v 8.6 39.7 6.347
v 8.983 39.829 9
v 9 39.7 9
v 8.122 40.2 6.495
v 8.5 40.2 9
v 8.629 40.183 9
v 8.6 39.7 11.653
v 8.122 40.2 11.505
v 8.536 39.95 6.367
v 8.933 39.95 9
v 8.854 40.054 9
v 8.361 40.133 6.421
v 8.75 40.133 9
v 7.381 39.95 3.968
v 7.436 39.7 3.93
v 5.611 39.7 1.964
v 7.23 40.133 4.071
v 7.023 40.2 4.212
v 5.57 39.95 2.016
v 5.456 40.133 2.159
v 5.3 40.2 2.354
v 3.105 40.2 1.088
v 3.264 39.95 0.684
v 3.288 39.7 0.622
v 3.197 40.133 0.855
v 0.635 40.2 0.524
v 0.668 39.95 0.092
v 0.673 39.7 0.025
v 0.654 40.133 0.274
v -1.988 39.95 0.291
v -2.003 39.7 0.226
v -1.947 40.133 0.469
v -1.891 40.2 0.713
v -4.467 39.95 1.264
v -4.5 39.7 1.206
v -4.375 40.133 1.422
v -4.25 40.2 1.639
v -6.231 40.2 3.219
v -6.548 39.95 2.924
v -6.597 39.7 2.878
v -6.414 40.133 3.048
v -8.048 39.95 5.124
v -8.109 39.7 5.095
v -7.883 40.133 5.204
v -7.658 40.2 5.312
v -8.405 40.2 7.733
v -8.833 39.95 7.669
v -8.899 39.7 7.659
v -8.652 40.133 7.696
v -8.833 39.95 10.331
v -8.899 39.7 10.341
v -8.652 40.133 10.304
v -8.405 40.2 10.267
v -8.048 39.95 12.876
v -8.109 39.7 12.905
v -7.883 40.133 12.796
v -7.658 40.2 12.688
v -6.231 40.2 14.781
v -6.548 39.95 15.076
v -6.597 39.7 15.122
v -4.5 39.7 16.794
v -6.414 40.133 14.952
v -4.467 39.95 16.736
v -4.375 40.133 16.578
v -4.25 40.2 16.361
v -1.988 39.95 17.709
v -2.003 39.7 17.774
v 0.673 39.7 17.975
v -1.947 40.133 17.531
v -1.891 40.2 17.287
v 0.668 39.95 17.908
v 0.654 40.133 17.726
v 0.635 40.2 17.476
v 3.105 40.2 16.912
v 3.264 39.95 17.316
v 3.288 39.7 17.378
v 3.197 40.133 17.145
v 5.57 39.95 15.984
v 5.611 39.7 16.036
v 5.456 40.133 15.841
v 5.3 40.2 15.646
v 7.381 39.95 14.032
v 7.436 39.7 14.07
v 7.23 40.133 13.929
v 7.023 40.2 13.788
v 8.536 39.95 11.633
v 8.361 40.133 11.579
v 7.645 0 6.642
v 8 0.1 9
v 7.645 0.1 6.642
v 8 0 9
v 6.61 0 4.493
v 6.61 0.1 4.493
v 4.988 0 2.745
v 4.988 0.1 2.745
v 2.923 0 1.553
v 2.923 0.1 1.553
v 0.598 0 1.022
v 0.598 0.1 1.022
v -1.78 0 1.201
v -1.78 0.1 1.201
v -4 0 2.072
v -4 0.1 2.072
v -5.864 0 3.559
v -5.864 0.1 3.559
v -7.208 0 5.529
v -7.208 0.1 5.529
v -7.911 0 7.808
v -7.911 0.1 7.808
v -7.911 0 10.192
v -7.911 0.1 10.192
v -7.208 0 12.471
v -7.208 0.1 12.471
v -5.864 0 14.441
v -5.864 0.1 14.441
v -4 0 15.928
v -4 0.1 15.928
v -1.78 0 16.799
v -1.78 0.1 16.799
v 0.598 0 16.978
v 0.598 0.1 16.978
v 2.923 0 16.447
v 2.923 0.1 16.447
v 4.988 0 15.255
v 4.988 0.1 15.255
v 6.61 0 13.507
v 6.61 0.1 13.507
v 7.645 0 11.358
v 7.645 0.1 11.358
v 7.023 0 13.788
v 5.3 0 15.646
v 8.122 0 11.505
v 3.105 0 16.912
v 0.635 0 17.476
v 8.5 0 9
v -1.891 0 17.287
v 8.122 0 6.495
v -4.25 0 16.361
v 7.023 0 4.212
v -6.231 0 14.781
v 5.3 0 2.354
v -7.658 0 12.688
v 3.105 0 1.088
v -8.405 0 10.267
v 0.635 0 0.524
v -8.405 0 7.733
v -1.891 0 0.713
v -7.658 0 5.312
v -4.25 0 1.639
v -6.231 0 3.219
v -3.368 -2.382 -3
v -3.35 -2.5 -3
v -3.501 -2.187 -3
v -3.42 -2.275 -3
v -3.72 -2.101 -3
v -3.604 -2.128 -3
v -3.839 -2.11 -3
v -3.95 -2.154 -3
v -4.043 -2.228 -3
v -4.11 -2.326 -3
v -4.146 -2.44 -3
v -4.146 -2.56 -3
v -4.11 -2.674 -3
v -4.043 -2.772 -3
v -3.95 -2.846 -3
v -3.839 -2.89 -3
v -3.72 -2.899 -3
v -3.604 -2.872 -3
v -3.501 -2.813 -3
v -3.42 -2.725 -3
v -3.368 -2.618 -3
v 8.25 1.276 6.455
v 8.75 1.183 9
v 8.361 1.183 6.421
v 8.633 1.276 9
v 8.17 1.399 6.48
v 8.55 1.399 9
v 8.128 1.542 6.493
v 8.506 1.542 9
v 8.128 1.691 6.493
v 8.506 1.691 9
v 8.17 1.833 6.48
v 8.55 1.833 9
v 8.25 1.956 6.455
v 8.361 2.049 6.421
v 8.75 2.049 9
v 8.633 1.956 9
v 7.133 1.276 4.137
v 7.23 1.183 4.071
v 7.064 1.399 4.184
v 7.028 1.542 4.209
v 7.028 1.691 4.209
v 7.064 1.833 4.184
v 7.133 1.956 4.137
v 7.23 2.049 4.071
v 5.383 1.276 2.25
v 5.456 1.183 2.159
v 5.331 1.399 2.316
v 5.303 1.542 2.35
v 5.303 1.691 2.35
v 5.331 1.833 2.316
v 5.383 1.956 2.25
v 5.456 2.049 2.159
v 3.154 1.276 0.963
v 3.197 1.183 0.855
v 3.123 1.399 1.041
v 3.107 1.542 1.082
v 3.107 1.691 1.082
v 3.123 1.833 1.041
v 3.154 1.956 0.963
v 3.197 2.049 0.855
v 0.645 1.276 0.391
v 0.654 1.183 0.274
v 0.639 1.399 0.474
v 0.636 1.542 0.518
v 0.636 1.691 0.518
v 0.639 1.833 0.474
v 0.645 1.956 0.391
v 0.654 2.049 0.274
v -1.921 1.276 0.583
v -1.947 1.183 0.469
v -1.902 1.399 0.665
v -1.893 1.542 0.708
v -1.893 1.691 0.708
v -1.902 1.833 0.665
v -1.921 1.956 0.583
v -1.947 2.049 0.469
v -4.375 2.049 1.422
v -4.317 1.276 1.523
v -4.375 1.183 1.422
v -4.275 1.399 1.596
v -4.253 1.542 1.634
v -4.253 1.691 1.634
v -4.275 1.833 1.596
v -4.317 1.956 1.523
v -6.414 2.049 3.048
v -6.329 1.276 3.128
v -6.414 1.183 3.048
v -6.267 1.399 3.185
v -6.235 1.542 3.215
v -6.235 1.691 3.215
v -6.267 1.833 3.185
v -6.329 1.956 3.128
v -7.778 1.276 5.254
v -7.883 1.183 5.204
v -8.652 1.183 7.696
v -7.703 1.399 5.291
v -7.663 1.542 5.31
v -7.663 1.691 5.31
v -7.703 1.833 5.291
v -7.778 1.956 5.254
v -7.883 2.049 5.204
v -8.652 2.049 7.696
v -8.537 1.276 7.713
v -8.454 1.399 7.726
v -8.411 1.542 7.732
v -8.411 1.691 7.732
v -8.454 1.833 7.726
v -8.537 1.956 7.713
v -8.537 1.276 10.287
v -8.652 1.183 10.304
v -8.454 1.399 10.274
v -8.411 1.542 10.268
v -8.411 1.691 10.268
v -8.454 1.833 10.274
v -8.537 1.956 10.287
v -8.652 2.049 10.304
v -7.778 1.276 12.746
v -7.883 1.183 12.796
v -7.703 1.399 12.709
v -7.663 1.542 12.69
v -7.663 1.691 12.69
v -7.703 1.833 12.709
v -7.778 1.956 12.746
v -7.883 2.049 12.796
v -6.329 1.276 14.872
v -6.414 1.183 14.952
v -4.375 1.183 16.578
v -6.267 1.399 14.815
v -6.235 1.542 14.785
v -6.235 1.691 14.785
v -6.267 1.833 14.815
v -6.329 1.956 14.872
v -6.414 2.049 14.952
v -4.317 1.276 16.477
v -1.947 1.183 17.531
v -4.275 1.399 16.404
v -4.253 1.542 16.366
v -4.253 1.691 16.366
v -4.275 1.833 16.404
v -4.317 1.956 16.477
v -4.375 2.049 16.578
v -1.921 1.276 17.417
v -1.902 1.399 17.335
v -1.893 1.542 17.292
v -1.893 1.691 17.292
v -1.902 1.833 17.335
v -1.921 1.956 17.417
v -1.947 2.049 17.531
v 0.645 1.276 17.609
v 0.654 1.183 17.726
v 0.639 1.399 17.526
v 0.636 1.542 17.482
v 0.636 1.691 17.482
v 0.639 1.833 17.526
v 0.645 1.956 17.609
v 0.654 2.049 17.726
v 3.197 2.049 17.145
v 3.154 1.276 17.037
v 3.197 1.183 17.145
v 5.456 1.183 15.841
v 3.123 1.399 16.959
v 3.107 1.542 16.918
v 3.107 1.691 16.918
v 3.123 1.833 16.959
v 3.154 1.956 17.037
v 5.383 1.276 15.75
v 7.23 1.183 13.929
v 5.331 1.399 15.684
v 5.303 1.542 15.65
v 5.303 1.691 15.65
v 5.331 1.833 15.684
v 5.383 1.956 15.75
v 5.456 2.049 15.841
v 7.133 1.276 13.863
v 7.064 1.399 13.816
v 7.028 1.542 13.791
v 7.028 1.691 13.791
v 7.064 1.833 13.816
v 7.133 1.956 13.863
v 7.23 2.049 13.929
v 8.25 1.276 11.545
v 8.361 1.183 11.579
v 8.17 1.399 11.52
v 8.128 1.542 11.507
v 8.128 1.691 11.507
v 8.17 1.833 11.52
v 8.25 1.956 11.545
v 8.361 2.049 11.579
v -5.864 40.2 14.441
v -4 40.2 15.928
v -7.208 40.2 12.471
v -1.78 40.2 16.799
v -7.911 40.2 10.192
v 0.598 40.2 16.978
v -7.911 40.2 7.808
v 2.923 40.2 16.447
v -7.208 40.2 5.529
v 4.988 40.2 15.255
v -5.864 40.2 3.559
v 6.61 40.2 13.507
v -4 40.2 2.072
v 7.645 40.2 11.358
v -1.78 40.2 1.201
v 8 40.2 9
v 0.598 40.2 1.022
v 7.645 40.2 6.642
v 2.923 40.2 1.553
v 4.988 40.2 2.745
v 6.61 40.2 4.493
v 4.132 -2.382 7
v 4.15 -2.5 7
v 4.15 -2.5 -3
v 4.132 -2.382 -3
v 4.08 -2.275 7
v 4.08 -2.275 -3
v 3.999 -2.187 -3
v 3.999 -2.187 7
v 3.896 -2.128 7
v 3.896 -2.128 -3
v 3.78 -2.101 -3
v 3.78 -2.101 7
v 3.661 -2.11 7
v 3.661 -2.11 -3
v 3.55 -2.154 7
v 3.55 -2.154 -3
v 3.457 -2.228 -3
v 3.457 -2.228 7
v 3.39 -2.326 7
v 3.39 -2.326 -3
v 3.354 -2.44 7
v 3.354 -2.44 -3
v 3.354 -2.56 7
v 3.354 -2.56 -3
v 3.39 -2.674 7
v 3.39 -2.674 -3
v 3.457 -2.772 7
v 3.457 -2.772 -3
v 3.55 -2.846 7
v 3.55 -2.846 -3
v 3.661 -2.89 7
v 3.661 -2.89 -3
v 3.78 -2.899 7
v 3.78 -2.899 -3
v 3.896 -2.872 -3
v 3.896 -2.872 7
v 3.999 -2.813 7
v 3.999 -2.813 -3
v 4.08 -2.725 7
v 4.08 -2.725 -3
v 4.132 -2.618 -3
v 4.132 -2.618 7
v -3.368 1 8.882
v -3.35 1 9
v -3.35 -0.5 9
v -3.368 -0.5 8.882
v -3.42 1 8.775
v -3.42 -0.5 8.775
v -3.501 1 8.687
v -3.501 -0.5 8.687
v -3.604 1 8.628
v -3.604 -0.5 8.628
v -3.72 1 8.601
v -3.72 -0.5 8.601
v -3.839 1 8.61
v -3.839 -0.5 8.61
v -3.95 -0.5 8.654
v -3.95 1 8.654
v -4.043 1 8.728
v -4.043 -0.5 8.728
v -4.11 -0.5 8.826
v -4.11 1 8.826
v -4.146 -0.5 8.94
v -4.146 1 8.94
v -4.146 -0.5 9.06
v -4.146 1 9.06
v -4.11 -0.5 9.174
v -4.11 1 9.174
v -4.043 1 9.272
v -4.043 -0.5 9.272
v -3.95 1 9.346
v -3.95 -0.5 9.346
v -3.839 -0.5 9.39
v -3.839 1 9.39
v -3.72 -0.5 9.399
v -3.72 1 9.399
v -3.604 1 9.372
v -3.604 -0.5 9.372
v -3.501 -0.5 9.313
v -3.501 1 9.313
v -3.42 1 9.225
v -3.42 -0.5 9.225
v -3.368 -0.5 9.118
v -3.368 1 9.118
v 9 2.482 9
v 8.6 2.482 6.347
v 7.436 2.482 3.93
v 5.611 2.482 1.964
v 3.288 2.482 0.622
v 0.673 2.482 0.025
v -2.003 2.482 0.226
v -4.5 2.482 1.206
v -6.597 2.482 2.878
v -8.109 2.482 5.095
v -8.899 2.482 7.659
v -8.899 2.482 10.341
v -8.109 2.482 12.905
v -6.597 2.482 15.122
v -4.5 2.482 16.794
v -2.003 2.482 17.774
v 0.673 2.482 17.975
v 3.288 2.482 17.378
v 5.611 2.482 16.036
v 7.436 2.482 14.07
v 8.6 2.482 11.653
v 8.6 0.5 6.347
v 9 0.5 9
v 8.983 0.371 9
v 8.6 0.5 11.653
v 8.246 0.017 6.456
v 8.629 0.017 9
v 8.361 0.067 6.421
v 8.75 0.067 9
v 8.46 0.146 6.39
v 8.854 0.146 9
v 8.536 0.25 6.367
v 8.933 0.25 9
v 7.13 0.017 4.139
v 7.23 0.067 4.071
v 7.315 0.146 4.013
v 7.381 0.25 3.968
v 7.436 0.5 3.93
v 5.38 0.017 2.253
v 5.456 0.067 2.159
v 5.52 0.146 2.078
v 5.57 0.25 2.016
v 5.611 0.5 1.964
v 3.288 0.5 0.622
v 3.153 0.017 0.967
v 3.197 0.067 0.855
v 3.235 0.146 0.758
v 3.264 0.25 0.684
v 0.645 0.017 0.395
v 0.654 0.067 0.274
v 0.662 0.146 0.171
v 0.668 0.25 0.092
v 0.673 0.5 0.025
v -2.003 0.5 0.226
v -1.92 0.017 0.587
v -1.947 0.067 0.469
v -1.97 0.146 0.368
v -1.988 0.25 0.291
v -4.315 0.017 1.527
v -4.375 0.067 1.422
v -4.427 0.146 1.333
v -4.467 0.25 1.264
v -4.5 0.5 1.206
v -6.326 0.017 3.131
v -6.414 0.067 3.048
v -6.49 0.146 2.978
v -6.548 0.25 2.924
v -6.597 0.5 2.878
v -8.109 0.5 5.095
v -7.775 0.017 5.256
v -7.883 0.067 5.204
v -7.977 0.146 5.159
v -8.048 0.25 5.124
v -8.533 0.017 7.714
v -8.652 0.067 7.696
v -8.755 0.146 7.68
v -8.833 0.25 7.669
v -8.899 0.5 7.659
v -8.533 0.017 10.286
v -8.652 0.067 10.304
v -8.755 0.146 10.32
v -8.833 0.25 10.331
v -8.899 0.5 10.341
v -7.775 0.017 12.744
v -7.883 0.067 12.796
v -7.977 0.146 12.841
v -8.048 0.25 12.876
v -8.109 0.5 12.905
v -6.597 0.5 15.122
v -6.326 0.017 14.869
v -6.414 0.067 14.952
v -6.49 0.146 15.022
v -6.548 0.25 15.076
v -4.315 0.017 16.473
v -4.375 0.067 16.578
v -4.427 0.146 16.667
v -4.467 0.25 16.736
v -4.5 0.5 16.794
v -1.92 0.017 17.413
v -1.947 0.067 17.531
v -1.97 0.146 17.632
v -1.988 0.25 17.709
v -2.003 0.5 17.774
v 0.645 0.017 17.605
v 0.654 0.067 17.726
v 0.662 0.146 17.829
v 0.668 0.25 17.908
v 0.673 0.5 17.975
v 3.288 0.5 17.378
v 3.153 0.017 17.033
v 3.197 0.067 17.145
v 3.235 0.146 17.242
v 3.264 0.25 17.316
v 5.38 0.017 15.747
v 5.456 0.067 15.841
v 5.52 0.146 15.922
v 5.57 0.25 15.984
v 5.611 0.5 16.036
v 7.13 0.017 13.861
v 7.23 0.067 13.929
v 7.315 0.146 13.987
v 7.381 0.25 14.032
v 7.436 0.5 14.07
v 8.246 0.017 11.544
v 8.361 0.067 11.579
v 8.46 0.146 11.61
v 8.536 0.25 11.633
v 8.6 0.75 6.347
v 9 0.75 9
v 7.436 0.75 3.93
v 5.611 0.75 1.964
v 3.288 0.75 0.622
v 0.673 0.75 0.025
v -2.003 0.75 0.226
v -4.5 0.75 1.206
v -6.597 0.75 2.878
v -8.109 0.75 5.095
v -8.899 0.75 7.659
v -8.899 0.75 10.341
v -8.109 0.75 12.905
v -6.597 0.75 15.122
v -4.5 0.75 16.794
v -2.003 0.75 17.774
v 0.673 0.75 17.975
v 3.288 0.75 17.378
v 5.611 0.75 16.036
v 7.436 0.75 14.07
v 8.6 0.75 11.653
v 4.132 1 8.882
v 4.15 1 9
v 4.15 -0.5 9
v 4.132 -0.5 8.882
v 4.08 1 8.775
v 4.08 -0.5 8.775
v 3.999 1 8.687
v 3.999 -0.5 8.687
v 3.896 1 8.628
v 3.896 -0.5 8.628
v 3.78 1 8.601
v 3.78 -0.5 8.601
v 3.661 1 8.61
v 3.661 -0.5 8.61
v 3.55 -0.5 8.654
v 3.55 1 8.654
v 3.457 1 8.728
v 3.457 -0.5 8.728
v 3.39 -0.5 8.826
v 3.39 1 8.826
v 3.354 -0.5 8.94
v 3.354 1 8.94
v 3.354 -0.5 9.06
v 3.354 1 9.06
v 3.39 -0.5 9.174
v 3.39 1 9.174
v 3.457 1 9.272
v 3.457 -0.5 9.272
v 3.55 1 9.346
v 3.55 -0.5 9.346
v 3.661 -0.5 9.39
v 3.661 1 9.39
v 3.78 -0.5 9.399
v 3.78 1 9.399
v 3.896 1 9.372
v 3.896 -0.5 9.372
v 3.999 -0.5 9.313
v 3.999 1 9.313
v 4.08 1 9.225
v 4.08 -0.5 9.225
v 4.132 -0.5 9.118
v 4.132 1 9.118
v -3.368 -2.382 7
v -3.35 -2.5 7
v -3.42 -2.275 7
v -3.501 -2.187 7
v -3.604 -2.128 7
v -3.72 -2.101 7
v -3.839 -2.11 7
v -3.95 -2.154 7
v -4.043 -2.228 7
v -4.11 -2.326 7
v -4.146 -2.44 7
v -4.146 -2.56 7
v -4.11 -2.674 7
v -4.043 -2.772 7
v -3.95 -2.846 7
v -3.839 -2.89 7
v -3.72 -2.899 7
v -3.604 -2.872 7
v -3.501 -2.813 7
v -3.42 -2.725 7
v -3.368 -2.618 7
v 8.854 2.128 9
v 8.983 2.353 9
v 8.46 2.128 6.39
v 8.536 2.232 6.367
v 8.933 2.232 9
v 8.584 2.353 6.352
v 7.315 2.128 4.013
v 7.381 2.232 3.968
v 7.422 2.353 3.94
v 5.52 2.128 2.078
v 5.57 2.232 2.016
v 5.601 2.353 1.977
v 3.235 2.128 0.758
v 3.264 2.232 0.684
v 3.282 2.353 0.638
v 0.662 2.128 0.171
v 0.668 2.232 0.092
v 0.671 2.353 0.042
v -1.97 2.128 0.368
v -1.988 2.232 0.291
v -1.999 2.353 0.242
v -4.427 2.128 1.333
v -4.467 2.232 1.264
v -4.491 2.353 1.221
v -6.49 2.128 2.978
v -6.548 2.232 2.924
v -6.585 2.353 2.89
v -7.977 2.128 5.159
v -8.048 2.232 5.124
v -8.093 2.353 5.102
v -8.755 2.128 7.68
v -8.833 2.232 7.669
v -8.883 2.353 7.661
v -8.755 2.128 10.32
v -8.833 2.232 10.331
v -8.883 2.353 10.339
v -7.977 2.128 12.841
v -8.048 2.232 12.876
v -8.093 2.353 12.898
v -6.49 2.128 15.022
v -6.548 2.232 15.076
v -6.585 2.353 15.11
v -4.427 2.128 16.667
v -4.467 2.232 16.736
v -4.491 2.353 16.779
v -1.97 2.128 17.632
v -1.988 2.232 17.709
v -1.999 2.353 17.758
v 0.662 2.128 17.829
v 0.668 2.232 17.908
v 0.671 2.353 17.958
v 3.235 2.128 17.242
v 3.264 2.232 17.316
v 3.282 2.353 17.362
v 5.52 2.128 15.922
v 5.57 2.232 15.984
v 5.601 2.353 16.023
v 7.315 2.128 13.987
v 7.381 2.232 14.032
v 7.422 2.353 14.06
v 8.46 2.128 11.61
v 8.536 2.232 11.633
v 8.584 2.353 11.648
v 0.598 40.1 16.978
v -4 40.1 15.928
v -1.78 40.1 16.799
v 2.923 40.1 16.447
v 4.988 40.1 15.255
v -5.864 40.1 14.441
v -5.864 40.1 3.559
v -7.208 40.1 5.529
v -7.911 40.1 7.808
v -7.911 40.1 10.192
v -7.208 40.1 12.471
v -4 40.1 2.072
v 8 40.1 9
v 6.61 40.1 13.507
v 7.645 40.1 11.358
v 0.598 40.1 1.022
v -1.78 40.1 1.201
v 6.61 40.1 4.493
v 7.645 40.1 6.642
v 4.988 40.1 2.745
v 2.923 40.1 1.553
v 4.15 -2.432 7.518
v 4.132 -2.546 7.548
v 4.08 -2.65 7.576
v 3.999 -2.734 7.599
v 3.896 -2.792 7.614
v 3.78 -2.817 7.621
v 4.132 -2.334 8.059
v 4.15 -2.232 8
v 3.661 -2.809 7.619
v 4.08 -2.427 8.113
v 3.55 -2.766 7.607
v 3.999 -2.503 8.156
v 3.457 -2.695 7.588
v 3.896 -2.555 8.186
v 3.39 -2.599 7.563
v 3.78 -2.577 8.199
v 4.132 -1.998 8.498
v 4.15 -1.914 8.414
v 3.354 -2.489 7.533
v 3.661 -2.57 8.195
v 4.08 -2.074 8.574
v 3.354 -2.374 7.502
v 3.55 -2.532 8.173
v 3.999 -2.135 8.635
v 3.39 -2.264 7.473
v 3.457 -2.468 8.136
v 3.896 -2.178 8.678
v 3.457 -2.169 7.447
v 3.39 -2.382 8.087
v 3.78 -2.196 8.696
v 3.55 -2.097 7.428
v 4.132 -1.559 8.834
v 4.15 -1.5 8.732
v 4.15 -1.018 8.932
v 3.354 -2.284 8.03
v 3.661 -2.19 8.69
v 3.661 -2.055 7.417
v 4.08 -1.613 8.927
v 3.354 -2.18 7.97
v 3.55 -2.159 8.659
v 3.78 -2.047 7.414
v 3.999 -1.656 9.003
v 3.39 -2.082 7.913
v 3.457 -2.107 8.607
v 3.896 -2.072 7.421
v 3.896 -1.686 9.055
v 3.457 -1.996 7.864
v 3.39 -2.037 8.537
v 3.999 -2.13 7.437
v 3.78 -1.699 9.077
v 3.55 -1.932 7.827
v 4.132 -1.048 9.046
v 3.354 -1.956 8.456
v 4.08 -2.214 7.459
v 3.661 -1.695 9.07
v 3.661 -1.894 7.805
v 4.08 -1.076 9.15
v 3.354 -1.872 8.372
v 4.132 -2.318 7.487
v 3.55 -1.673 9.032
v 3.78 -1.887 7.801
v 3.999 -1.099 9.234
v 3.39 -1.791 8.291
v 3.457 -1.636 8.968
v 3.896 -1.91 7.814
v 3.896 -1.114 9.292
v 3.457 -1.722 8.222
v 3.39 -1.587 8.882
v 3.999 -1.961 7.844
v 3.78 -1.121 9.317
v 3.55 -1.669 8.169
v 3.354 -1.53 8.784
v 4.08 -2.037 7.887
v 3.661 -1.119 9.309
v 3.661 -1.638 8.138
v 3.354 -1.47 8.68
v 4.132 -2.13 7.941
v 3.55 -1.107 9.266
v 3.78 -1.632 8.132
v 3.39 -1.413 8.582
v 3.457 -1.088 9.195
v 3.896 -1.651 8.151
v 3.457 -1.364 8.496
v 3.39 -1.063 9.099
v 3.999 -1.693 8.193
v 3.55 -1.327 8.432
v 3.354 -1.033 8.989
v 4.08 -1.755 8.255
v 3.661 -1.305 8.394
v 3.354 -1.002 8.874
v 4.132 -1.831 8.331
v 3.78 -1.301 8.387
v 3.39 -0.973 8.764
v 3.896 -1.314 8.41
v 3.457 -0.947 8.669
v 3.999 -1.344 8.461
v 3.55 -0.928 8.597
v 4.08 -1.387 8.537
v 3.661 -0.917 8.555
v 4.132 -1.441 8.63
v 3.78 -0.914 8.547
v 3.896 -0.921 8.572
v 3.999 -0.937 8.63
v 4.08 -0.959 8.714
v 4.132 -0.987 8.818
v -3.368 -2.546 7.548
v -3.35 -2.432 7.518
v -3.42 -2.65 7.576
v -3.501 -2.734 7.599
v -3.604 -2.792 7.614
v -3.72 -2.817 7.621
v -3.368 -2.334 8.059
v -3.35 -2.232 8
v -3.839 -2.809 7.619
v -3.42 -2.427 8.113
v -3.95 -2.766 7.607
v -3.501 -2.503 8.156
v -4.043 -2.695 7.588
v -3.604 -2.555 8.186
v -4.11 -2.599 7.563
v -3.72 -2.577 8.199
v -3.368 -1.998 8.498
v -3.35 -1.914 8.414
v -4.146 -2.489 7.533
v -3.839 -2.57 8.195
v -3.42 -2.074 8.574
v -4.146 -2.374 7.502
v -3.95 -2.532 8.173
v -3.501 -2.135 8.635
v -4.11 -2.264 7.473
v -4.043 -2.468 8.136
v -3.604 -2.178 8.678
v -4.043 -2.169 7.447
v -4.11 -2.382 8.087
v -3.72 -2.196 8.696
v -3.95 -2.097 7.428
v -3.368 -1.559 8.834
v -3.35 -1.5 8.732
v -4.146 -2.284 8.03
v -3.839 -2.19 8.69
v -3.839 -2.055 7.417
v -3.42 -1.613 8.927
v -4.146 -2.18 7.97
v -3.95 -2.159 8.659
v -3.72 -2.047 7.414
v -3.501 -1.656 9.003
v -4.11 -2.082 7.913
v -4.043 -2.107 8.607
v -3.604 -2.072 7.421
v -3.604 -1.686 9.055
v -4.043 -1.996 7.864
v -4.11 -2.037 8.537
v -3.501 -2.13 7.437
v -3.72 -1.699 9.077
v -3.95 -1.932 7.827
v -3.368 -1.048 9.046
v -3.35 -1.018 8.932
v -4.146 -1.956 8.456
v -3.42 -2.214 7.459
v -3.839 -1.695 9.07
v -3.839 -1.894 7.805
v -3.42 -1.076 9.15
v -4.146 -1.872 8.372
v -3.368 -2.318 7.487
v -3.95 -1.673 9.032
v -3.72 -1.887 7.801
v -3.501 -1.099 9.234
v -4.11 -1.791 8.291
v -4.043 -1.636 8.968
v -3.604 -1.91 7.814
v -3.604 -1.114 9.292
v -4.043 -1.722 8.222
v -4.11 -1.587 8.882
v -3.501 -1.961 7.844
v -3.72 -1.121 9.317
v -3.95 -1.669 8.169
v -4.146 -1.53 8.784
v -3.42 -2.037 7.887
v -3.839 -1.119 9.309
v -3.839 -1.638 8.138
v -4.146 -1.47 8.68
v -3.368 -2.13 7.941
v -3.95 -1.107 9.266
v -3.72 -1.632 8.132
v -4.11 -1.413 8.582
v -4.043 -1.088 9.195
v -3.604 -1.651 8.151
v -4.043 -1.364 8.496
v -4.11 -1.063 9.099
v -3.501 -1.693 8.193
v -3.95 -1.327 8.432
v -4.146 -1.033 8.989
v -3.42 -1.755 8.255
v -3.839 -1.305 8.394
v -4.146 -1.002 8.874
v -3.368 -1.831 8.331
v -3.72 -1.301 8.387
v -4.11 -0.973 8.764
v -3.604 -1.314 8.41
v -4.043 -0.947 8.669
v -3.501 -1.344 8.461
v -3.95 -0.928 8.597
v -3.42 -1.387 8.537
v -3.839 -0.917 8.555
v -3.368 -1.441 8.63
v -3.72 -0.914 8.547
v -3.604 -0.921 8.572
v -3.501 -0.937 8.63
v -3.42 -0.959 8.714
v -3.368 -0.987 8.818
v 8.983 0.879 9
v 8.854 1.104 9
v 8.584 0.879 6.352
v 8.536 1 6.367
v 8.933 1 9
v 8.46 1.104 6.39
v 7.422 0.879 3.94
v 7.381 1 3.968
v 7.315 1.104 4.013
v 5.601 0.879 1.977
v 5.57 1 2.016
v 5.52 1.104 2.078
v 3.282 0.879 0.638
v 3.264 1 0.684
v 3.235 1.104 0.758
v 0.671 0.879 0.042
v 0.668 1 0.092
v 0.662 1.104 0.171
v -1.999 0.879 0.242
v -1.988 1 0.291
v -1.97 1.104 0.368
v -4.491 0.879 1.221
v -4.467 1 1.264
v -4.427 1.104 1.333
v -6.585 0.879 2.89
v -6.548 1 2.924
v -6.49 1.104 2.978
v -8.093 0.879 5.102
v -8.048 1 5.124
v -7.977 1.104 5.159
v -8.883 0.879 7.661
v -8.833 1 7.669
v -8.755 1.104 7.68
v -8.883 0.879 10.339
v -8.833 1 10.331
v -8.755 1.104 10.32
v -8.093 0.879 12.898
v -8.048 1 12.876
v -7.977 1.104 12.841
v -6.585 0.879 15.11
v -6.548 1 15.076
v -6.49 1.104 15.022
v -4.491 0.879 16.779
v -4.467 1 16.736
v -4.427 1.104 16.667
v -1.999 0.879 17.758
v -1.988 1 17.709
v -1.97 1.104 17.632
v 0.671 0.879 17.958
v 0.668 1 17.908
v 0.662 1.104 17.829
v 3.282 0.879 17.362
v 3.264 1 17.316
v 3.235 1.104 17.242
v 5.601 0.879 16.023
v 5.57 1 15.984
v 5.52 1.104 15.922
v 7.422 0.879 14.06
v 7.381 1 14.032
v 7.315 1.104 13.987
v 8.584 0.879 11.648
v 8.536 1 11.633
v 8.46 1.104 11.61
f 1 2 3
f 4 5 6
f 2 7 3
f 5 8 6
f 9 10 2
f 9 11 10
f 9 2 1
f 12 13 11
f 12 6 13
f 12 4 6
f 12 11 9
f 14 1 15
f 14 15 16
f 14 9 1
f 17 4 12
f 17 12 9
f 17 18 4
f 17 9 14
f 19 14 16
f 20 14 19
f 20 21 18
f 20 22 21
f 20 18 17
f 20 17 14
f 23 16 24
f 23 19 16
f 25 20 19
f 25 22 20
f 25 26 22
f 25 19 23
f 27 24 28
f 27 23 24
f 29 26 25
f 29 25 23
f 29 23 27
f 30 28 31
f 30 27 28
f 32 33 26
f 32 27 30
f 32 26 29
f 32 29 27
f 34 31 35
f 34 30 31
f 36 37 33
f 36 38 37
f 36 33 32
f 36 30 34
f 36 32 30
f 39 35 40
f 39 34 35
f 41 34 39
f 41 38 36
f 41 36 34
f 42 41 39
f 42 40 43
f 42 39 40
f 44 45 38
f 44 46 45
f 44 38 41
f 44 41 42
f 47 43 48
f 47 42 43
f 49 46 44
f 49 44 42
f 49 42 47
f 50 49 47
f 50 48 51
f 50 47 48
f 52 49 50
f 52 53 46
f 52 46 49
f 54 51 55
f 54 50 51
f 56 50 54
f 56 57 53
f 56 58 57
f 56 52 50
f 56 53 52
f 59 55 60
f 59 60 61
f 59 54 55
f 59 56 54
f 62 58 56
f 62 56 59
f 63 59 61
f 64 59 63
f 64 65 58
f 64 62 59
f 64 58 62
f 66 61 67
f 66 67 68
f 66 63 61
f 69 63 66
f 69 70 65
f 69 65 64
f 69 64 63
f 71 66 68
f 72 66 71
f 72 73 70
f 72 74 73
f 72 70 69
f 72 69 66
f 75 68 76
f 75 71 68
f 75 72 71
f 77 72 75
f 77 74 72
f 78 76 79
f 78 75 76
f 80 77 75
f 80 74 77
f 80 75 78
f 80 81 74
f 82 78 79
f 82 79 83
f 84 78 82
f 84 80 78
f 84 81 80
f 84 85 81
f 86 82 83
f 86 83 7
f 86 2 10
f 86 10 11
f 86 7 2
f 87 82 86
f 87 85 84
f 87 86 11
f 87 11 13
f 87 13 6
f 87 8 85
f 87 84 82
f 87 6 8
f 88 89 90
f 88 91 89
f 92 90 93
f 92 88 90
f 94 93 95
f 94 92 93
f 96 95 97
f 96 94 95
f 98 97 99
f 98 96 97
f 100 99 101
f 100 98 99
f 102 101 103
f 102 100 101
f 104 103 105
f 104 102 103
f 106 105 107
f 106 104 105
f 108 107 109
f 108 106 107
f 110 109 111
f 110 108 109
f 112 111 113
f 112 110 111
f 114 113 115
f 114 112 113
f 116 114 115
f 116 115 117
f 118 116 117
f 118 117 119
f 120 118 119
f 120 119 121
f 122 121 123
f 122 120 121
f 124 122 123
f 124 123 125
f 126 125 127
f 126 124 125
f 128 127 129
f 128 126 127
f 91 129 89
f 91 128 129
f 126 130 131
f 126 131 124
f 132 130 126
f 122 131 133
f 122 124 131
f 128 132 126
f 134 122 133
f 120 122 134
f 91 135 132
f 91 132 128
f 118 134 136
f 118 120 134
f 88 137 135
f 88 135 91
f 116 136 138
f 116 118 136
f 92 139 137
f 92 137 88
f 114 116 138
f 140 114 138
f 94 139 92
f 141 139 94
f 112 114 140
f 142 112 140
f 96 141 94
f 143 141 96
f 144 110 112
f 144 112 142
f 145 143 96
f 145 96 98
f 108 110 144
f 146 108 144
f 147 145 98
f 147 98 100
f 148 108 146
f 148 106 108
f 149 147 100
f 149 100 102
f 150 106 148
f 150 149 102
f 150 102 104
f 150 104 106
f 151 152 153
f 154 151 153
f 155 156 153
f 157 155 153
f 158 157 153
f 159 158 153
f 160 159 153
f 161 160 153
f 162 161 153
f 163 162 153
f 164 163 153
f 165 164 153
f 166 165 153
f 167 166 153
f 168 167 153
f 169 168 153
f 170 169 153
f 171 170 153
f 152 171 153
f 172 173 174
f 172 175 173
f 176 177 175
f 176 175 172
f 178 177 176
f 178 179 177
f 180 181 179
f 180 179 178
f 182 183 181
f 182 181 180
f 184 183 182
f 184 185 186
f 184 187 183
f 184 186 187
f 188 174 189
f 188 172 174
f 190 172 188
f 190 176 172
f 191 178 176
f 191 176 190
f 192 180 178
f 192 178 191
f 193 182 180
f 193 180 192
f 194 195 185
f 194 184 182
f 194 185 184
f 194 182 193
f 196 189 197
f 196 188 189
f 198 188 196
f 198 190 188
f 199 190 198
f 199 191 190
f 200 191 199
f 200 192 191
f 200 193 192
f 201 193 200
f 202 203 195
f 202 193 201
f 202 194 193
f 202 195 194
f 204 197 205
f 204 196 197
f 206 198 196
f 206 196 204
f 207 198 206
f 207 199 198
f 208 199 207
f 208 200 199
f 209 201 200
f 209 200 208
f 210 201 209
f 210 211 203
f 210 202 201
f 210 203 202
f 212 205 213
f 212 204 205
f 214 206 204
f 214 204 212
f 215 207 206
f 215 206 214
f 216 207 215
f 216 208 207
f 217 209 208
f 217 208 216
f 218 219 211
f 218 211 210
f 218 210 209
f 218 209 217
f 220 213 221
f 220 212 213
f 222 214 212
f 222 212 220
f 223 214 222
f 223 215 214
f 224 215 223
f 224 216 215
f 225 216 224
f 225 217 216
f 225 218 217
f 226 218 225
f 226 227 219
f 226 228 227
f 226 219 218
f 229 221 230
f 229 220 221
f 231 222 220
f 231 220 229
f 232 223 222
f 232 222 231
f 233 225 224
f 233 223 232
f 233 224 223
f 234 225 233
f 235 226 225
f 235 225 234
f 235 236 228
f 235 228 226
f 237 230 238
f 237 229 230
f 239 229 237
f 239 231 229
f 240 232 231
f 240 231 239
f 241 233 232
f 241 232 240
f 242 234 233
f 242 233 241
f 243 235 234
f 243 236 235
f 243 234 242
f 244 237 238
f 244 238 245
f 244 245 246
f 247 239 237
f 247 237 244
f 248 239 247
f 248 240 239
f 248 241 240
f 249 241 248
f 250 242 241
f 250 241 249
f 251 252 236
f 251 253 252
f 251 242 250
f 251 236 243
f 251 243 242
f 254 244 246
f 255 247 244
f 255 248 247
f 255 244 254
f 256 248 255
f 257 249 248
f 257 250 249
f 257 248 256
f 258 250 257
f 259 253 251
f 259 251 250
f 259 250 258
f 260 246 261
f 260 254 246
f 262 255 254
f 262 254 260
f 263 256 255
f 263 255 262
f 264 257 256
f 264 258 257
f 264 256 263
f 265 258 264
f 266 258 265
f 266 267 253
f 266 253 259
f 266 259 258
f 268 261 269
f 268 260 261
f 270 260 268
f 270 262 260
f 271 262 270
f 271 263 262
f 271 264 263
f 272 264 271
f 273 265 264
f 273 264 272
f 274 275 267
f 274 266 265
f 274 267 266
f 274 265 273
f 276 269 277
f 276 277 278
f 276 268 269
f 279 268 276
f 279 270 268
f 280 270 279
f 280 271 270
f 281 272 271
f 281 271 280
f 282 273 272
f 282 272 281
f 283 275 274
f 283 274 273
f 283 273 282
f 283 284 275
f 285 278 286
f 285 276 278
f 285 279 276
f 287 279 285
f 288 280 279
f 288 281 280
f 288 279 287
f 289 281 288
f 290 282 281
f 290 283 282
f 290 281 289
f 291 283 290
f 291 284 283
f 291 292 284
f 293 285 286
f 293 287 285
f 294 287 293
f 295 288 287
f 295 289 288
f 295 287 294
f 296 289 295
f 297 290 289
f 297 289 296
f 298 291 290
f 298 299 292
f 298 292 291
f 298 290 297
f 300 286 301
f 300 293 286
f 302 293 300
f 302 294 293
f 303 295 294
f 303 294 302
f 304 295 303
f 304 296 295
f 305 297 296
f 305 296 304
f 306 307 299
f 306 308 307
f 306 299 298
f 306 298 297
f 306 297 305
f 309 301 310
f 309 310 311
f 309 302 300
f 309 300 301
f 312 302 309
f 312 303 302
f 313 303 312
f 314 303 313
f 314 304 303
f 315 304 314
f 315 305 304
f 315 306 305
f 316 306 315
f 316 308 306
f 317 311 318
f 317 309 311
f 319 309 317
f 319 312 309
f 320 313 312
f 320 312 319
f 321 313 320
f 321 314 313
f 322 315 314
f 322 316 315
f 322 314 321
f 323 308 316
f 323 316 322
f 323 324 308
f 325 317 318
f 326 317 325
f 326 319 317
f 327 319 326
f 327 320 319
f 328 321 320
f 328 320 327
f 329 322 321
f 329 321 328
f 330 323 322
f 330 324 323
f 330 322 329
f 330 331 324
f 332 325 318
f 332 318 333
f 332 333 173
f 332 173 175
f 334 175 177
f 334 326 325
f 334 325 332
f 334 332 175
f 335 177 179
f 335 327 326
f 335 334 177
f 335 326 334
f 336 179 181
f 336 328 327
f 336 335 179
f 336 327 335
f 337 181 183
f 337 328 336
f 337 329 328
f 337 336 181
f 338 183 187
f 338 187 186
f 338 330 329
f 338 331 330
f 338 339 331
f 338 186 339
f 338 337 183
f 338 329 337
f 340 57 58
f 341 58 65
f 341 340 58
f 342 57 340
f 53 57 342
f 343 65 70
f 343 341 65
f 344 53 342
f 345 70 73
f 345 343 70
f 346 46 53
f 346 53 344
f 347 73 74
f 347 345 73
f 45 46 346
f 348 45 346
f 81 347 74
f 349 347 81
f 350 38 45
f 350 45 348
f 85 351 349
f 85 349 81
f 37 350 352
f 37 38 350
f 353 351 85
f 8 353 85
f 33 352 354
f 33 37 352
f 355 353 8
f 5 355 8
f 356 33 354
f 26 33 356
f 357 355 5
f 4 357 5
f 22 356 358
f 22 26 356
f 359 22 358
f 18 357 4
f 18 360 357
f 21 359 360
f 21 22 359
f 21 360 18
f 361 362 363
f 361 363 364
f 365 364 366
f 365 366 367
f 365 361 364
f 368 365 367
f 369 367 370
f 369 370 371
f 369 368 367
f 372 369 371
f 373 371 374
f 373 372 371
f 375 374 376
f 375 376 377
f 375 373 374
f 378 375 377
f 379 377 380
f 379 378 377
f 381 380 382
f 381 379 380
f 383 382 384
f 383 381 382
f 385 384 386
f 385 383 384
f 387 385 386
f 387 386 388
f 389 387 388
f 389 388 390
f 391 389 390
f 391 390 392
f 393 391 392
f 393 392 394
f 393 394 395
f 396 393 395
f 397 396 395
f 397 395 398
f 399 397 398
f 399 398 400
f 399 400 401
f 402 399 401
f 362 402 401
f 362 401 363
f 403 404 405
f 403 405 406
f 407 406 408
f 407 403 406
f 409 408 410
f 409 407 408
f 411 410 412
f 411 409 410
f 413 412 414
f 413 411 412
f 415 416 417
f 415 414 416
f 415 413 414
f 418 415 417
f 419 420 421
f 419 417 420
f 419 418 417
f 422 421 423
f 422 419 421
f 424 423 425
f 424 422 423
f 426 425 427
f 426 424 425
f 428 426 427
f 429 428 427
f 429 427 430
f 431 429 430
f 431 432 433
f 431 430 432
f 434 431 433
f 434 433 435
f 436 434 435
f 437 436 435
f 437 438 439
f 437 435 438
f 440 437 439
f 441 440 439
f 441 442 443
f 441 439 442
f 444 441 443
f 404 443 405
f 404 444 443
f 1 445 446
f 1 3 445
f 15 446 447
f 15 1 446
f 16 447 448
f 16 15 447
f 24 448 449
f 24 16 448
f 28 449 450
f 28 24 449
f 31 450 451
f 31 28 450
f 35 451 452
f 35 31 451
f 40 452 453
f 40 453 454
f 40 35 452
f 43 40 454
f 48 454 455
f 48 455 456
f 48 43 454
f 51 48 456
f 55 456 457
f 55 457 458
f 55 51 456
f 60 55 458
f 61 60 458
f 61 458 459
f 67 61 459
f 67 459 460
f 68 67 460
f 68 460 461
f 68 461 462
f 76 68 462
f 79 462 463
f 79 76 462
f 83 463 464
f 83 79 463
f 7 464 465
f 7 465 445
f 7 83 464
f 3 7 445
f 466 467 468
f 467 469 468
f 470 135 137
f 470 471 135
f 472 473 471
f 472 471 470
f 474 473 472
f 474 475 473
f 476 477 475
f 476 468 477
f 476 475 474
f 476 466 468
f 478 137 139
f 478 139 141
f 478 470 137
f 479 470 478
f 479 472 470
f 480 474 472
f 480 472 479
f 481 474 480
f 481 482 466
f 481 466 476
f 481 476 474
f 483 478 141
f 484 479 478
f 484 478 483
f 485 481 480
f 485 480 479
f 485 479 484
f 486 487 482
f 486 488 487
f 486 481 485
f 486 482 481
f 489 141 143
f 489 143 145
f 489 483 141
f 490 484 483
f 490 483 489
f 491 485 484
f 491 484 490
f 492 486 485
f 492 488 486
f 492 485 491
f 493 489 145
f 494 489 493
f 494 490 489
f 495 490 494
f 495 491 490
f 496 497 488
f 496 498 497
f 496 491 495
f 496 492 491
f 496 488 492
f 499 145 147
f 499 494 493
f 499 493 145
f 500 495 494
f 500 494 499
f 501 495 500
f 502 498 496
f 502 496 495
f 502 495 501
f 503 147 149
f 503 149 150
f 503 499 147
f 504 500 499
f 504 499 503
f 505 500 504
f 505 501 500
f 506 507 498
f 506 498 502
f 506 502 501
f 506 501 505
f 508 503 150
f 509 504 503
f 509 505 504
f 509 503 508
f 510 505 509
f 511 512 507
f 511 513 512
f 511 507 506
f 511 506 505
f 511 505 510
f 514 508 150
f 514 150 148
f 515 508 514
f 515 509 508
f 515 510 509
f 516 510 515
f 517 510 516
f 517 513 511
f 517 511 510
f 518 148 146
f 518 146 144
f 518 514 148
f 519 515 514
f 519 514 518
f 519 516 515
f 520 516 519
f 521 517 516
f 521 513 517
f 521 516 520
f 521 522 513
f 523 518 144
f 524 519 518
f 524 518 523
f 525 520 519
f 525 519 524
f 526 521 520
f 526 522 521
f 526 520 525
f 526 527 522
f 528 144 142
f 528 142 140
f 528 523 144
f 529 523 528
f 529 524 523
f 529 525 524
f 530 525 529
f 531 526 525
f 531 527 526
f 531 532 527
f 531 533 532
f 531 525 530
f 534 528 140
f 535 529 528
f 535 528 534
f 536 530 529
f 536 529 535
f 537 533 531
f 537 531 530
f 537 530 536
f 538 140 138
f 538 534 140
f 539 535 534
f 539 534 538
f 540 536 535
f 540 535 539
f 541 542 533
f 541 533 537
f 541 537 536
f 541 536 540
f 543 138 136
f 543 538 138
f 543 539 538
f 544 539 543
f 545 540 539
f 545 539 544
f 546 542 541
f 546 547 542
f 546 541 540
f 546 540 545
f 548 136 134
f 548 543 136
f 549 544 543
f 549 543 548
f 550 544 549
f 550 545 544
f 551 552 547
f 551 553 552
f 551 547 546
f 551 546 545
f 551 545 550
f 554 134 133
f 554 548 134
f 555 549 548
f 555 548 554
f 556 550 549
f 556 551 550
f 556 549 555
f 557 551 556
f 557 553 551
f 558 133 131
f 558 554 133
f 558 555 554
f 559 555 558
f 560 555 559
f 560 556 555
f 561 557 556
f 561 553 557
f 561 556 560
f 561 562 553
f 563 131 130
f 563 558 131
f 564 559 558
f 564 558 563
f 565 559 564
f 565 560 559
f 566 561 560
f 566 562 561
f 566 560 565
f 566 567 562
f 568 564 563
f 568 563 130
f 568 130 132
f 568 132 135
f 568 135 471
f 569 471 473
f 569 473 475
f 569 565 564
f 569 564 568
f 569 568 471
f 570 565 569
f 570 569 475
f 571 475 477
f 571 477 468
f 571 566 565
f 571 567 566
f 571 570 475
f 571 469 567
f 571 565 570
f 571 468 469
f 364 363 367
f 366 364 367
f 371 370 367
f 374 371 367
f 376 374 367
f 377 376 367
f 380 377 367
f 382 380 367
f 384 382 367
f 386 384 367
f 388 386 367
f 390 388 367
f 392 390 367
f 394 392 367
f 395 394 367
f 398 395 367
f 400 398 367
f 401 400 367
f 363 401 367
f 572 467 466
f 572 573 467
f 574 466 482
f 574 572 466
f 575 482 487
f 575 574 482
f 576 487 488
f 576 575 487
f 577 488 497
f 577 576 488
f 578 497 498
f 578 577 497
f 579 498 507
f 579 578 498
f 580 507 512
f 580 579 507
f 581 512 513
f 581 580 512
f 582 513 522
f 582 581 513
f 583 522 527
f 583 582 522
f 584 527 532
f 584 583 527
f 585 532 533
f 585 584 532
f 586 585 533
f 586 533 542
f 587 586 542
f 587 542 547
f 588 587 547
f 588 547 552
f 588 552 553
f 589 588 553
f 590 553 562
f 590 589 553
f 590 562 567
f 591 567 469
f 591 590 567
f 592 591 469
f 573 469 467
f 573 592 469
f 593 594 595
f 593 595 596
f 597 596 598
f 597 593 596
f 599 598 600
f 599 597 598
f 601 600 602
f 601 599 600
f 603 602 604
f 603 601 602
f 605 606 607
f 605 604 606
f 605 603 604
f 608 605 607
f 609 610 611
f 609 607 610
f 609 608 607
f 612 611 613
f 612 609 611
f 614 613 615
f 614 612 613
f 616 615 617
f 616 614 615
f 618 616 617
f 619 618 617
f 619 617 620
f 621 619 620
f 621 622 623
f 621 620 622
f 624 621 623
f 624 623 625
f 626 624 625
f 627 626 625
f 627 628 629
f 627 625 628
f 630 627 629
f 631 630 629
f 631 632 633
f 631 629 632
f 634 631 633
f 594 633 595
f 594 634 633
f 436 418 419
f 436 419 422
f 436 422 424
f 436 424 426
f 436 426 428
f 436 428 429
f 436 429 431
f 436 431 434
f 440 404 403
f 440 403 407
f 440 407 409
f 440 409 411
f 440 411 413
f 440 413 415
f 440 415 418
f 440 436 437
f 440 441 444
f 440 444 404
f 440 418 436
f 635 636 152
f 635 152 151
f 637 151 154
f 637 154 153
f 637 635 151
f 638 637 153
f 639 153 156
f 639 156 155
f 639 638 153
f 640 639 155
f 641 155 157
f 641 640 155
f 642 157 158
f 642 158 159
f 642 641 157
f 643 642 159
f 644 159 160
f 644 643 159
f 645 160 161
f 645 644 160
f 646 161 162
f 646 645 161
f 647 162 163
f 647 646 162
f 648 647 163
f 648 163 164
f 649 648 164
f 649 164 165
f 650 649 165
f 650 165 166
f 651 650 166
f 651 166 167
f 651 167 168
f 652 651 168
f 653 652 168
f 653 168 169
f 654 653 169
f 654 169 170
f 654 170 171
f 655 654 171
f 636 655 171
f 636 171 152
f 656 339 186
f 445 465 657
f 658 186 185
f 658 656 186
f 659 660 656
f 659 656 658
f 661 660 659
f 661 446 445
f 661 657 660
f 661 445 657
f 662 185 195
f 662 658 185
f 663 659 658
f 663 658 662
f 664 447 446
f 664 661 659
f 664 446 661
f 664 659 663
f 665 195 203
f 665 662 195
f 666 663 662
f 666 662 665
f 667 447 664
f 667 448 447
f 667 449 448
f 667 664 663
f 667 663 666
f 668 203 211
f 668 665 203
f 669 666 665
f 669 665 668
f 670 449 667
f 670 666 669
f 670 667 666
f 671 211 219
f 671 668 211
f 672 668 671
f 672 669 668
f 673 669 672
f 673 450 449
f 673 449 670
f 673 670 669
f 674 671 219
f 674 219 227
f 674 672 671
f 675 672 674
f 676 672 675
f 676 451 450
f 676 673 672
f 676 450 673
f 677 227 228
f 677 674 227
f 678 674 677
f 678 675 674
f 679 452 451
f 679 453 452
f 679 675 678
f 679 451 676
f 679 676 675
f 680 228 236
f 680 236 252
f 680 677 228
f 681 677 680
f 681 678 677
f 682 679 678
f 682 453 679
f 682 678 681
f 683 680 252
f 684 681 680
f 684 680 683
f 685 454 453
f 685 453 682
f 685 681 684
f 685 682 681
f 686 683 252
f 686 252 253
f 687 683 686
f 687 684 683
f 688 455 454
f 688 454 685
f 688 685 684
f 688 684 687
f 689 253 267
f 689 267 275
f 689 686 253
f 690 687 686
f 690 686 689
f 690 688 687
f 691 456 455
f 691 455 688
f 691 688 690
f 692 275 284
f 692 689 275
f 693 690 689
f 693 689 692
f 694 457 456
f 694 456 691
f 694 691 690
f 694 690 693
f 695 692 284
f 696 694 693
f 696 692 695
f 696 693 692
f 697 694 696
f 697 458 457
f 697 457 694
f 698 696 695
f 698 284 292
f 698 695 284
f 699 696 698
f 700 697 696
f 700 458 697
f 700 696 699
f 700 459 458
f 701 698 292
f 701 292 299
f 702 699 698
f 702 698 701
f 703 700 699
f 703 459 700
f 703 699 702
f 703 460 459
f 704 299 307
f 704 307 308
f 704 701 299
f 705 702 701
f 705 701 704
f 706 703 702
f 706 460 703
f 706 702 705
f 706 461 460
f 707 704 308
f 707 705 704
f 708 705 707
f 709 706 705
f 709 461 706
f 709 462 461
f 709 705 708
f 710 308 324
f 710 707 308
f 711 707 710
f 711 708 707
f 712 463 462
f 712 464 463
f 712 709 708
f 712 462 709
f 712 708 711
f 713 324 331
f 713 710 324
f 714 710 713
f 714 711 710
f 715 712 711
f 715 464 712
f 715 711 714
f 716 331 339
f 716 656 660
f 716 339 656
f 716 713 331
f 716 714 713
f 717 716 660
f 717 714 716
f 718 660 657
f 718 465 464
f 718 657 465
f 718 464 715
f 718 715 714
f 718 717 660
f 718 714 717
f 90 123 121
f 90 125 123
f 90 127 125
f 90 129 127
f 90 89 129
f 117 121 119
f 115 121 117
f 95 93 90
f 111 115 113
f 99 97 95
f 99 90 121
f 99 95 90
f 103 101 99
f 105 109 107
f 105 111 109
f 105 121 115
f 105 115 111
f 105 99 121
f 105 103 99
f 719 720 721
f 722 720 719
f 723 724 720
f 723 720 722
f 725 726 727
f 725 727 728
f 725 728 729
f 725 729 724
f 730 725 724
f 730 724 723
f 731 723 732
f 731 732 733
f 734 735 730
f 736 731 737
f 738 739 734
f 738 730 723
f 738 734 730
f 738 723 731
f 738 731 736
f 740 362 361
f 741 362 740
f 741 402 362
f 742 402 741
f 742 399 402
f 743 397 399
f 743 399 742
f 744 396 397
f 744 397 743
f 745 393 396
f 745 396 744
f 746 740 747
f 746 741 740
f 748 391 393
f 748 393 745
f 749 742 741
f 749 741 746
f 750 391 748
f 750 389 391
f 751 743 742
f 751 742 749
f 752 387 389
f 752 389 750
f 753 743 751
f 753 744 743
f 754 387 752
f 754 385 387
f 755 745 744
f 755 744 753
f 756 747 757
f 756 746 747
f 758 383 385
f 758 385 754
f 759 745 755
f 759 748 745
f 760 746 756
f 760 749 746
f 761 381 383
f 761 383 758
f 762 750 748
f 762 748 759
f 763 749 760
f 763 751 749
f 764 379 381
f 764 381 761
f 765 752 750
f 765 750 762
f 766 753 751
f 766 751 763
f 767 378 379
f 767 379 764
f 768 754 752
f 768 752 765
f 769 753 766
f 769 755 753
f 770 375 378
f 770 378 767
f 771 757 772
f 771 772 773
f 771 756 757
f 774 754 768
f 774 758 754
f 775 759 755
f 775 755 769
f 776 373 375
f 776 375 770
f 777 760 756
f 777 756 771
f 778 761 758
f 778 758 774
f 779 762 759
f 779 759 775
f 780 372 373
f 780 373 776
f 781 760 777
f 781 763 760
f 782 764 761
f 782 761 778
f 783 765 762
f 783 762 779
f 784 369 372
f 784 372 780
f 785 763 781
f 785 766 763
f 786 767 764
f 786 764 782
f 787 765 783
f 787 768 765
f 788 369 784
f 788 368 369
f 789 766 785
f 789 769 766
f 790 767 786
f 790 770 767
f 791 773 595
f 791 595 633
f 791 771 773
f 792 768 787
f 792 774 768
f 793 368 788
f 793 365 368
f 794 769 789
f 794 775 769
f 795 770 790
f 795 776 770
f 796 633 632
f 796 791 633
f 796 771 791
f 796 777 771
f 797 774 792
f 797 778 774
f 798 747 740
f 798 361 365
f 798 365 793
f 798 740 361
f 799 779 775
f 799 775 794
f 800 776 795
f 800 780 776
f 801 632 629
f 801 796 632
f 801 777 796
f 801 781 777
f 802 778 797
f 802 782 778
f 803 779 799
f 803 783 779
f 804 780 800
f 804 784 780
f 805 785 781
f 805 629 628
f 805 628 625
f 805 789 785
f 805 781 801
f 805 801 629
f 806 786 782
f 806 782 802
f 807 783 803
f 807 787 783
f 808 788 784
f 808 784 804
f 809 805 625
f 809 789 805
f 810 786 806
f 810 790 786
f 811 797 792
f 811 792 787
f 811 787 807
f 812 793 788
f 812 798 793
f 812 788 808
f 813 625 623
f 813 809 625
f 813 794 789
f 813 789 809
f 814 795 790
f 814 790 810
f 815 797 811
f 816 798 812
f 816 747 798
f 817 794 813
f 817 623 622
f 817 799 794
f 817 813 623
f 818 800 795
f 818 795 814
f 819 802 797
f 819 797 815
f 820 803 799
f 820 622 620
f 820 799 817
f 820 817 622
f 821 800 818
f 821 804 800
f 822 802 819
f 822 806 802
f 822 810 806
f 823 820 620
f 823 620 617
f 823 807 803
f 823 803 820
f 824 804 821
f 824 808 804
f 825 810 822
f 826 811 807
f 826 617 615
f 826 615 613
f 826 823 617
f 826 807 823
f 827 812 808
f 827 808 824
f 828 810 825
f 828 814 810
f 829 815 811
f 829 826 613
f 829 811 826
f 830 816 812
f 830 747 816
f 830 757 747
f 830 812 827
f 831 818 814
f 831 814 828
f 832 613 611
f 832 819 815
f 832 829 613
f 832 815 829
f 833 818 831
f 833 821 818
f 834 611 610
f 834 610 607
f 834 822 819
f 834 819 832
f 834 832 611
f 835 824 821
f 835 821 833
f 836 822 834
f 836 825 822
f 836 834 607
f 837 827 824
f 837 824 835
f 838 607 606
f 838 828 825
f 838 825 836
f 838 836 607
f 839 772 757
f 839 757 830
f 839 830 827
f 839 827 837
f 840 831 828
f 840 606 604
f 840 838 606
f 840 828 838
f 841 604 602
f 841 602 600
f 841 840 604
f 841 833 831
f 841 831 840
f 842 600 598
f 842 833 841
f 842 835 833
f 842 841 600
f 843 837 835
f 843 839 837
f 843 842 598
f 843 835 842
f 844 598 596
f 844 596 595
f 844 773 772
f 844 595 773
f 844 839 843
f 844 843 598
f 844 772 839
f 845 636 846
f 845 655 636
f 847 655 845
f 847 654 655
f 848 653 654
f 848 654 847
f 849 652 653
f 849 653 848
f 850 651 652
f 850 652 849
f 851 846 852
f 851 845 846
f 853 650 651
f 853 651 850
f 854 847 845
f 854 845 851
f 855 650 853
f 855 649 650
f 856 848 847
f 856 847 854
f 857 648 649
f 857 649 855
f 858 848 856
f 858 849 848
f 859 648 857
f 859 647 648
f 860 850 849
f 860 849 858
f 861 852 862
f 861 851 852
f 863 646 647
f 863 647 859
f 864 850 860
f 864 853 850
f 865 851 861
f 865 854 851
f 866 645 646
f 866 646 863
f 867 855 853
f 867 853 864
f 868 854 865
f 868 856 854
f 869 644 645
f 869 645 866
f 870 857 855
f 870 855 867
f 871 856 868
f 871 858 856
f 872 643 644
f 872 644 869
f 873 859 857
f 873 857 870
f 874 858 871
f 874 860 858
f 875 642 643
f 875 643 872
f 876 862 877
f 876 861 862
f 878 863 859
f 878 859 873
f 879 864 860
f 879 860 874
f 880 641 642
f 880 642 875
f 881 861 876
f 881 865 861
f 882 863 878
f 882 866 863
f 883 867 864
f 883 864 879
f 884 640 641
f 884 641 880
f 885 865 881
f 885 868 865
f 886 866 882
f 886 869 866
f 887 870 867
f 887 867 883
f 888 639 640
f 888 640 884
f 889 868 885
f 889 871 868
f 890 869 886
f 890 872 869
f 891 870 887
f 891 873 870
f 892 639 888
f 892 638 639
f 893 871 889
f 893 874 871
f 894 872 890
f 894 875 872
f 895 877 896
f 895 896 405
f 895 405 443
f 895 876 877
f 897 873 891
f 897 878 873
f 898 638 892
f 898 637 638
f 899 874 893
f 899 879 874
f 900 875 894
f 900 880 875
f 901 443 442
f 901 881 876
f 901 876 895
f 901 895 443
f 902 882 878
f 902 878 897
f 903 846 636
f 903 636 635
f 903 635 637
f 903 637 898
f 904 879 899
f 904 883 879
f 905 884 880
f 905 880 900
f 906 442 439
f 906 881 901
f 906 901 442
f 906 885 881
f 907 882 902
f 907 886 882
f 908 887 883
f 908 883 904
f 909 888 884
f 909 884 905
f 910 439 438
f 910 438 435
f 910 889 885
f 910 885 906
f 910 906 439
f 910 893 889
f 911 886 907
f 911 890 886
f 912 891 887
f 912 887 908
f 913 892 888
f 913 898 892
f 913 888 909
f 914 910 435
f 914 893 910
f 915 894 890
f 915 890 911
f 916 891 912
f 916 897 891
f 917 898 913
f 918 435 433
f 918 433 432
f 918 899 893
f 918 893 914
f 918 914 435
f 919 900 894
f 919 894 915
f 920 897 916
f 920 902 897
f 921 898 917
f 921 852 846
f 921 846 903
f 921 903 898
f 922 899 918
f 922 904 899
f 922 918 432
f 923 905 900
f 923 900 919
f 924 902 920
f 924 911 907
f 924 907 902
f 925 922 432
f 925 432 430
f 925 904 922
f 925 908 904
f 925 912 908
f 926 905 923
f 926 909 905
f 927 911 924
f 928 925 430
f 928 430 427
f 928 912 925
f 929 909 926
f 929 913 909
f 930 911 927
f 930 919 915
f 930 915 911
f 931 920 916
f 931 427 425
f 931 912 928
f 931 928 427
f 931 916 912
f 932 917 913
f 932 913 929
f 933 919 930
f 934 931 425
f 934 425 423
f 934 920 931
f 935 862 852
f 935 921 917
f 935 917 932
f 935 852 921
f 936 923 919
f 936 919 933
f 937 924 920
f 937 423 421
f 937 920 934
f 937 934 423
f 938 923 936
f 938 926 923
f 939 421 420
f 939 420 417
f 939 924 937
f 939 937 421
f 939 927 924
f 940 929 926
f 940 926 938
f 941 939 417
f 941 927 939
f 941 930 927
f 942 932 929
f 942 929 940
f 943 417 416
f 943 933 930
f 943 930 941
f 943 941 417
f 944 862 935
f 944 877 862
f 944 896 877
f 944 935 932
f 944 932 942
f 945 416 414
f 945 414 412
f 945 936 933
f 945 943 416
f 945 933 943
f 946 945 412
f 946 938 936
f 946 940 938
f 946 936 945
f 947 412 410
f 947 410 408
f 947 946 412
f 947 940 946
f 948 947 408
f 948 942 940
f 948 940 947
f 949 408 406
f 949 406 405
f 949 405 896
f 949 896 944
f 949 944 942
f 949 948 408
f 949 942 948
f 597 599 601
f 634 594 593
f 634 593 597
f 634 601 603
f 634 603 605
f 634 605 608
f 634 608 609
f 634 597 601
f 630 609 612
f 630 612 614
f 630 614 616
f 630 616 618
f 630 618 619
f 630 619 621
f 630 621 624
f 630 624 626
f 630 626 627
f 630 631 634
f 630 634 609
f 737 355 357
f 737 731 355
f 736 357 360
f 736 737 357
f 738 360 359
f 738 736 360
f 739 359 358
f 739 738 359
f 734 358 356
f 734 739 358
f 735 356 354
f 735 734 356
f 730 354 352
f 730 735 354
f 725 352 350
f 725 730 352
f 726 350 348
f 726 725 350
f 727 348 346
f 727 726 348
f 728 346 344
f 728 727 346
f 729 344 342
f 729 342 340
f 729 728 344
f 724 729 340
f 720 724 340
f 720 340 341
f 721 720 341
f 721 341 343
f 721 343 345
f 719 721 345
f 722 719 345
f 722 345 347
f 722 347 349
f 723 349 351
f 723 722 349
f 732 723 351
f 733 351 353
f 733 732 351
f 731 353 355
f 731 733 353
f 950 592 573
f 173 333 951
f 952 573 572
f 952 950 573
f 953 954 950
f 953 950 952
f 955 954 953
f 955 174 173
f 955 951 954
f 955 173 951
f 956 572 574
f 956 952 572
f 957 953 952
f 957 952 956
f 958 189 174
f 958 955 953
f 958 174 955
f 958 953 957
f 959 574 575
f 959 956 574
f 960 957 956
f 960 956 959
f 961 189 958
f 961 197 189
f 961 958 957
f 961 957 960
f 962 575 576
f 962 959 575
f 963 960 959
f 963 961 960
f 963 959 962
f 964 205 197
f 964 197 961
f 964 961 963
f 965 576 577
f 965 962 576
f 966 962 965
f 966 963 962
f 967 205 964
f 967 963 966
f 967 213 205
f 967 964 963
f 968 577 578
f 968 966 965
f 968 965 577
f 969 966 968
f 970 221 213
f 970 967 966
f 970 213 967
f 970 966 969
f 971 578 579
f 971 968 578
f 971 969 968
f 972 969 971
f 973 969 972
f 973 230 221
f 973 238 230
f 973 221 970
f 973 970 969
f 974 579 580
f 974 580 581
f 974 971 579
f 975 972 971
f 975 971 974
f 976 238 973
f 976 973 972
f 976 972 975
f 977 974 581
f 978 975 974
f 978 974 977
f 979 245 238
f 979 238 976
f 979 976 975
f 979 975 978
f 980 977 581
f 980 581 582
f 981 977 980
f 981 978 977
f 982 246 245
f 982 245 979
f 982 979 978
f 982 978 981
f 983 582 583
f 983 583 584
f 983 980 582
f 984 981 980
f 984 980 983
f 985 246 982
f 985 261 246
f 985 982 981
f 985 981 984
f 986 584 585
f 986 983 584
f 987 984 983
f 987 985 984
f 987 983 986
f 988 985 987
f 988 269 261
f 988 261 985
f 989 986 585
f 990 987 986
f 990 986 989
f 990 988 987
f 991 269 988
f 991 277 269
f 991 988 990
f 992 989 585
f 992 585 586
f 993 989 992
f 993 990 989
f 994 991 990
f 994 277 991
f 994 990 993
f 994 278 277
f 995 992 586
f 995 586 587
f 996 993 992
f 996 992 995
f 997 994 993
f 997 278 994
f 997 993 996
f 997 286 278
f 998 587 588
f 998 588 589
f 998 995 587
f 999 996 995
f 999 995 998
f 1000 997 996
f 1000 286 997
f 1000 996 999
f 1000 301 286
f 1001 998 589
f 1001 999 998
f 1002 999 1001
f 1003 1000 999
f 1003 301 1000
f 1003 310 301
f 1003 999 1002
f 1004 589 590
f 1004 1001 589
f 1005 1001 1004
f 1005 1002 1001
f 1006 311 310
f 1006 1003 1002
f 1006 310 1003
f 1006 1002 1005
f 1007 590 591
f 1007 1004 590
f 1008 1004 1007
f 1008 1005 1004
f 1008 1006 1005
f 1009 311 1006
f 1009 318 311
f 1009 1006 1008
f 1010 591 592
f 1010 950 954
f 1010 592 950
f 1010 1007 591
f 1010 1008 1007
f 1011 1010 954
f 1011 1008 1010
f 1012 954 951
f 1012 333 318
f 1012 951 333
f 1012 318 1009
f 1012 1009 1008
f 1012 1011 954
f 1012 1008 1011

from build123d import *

# Parameters (mm, degrees)
SKETCH1_R = 0.4


with BuildPart() as part:
    # По траектории1: sweep along a path in Эскиз1
    with BuildLine(Plane(origin=(0, 0, 0), x_dir=(0, 0, -1), z_dir=(1, 0, 0))) as sweep_1_path:
        Line((3, -2.5), (-7, -2.5))
        ThreePointArc((-7, -2.5), (-8.414213562, -1.914213562), (-9, -0.5))
        Line((-9, -0.5), (-9, 0))
        Line((-9, 0), (-9, 1))
    # Sketch1 → По траектории1 (sweep)
    with BuildSketch(Plane(origin=(0, 0, 0), x_dir=(1, 0, 0), z_dir=(0, 1, 0))):
        with Locations((-3.75, -9)):
            Circle(SKETCH1_R)
        with Locations((3.75, -9)):
            Circle(SKETCH1_R)
    sweep(path=sweep_1_path.line)


with BuildPart() as body_2:
    # Sketch3 → Revolve1 (revolve)
    with BuildSketch(Plane.XY.offset(9)):
        with BuildLine():
            Line((9, 0.5), (9, 0.75))
            ThreePointArc((9, 0.75), (8.933012702, 1), (8.75, 1.183012702))
            ThreePointArc((8.75, 1.183012702), (8.5, 1.616025404), (8.75, 2.049038106))
            ThreePointArc((8.75, 2.049038106), (8.933012702, 2.232050808), (9, 2.482050808))
            Line((9, 2.482050808), (9, 39.7))
            ThreePointArc((9, 39.7), (8.853553391, 40.053553391), (8.5, 40.2))
            Line((8.5, 40.2), (8, 40.2))
            Line((8, 40.2), (8, 40.1))
            Line((8, 40.1), (0, 40.1))
            Line((0, 40.1), (0, 0.1))
            Line((0, 0.1), (8, 0.1))
            Line((8, 0.1), (8, 0))
            Line((8, 0), (8.5, 0))
            ThreePointArc((8.5, 0), (8.853553391, 0.146446609), (9, 0.5))
        make_face()
    revolve(axis=Axis((0, 0.1, 9), (0, 1, 0)))


solid = Compound([part.part, body_2.part])
